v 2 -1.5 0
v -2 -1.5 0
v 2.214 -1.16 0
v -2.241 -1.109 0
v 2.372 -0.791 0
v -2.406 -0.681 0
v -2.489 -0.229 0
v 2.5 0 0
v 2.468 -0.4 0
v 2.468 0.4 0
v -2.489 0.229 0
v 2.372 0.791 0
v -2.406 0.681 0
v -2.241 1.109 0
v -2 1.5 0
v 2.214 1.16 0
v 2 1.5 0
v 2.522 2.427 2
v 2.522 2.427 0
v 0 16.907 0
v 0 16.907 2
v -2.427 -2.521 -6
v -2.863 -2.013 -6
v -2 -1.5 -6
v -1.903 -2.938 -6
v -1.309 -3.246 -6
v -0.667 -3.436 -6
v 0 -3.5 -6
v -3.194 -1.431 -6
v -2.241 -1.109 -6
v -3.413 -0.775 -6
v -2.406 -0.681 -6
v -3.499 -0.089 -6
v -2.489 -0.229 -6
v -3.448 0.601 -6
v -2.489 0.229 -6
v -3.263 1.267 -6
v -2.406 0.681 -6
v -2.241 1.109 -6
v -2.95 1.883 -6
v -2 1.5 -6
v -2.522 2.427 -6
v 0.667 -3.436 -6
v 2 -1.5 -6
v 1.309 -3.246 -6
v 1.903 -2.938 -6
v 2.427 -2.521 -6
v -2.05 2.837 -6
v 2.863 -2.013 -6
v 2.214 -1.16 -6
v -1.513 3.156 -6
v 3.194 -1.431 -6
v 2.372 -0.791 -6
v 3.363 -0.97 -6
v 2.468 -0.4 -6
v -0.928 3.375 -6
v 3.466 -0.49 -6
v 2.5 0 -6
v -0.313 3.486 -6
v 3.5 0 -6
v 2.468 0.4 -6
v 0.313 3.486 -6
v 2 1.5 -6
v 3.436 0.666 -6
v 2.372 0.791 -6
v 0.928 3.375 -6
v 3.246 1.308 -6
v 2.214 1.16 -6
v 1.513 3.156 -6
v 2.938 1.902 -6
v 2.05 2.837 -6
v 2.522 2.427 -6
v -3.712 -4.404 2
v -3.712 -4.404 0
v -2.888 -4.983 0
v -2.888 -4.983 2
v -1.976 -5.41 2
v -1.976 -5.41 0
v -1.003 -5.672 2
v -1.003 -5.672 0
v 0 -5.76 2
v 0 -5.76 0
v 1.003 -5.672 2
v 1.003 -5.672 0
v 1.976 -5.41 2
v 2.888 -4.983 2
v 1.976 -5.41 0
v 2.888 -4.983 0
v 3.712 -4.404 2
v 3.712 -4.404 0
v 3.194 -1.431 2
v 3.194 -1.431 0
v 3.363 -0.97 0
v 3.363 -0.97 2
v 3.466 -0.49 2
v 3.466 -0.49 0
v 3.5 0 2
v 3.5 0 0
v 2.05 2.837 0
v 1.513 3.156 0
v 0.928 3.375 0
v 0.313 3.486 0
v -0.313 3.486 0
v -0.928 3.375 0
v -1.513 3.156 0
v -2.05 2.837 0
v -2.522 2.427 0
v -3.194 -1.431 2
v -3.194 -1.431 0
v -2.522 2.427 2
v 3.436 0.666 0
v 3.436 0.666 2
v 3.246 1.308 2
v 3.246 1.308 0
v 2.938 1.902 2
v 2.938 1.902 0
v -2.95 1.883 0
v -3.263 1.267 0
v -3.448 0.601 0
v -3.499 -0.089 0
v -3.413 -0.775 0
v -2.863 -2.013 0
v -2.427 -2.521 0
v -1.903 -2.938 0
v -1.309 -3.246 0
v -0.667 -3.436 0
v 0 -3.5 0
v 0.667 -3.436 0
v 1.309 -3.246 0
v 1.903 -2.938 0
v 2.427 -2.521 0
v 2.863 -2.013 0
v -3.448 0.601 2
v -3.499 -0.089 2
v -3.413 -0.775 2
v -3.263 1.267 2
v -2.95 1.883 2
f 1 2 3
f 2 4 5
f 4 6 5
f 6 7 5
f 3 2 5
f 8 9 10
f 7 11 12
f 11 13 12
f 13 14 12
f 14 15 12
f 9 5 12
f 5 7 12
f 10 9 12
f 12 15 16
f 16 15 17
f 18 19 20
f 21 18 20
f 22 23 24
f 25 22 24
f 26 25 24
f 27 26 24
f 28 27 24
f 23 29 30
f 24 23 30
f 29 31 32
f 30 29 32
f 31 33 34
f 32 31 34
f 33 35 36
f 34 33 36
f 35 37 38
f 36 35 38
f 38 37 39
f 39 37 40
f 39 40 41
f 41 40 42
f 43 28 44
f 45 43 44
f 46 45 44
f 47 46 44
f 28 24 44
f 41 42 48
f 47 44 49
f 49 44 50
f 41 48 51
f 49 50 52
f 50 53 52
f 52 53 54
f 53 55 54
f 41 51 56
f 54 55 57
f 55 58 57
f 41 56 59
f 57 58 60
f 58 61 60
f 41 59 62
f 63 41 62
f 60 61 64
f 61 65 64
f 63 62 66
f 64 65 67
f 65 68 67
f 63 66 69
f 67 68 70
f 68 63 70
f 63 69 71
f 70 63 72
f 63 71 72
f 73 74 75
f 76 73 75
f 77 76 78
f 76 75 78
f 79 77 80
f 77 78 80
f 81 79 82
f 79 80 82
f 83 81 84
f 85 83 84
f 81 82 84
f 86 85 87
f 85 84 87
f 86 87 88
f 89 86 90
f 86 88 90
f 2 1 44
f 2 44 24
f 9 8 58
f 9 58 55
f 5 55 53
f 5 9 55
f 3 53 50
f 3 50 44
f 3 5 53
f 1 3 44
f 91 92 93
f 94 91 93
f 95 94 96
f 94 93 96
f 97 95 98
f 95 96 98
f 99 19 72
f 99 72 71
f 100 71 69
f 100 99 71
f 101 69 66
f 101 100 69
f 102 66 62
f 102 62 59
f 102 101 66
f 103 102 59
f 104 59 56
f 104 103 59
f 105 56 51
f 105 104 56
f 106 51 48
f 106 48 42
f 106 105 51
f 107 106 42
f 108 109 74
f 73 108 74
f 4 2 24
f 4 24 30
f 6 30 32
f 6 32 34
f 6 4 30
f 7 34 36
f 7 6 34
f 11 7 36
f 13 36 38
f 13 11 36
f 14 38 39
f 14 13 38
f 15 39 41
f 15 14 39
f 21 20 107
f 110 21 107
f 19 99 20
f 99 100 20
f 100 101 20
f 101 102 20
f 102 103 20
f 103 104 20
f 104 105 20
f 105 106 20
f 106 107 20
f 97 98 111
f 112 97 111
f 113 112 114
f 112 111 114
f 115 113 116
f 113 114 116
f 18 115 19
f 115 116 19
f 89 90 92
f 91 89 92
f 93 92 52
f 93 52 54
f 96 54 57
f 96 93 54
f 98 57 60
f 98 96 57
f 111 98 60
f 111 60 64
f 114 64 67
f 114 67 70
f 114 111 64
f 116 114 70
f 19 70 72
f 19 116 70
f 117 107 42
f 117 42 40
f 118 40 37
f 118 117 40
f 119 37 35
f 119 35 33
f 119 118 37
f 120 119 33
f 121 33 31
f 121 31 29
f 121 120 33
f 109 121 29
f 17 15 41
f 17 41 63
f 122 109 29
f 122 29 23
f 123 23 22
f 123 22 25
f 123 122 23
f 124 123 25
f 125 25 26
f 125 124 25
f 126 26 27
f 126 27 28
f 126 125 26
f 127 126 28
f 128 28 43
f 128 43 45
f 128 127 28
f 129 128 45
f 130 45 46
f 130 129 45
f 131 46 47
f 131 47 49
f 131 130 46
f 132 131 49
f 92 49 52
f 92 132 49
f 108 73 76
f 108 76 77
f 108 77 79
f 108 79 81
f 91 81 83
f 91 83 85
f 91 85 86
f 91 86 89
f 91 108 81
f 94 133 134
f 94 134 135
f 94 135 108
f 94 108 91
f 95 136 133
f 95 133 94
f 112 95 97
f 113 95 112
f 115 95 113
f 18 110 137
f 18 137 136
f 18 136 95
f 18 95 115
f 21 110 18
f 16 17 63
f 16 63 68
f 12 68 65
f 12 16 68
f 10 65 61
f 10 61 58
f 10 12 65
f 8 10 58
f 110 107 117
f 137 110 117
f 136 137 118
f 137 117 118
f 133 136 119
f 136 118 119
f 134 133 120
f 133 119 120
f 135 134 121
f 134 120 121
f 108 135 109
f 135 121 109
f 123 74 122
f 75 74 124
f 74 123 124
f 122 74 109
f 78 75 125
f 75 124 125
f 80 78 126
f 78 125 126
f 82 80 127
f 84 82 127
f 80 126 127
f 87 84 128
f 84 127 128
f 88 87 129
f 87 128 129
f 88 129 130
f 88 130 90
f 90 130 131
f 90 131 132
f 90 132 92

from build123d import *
from build123d import SkipClean  # not in build123d's __all__

# Parameters (mm, degrees)
F1_DEPTH = 2
F2_DEPTH = 6


with BuildPart() as f1:
    # F0 (on Top) → F1 (new body)
    with BuildSketch(Plane.XY):
        with BuildLine():
            Line((-2.522197513, 2.4266272284), (-3.1941037004, -1.430979228))
            ThreePointArc((-3.1941037004, -1.430979228), (0, -3.5), (3.1941037004, -1.430979228))
            Line((3.1941037004, -1.430979228), (2.522197513, 2.4266272284))
            ThreePointArc((2.522197513, 2.4266272284), (0, 3.5), (-2.522197513, 2.4266272284))
        make_face()
        with BuildLine():
            ThreePointArc((2, 1.5), (2.3717082451, 0.790569415), (2.5, 0))
            ThreePointArc((2.5, 0), (2.3717082451, -0.790569415), (2, -1.5))
            ThreePointArc((2, -1.5), (0, -2.5), (-2, -1.5))
            ThreePointArc((-2, -1.5), (-2.5, 0), (-2, 1.5))
            ThreePointArc((-2, 1.5), (0, 2.5), (2, 1.5))
        make_face(mode=Mode.SUBTRACT)
        with BuildLine():
            Line((0, 16.9072877616), (-2.522197513, 2.4266272284))
            ThreePointArc((-2.522197513, 2.4266272284), (0, 3.5), (2.522197513, 2.4266272284))
            Line((2.522197513, 2.4266272284), (0, 16.9072877616))
        make_face()
        with BuildLine():
            Line((-3.1941037004, -1.430979228), (-3.7119607441, -4.4041452929))
            ThreePointArc((-3.7119607441, -4.4041452929), (0, -5.7597871772), (3.7119607441, -4.4041452929))
            Line((3.7119607441, -4.4041452929), (3.1941037004, -1.430979228))
            ThreePointArc((3.1941037004, -1.430979228), (0, -3.5), (-3.1941037004, -1.430979228))
        make_face()
        with BuildLine():
            ThreePointArc((2, -1.5), (2.3717082451, -0.790569415), (2.5, 0))
            ThreePointArc((2.5, 0), (2.3717082451, 0.790569415), (2, 1.5))
            Line((2, 1.5), (-2, 1.5))
            ThreePointArc((-2, 1.5), (-2.5, 0), (-2, -1.5))
            Line((-2, -1.5), (2, -1.5))
        make_face()
        with BuildLine():
            Line((-2, 1.5), (2, 1.5))
            ThreePointArc((2, 1.5), (0, 2.5), (-2, 1.5))
        make_face()
        with BuildLine():
            ThreePointArc((-2, -1.5), (0, -2.5), (2, -1.5))
            Line((2, -1.5), (-2, -1.5))
        make_face()
        with BuildLine():
            Line((2.522197513, 2.4266272284), (3.1941037004, -1.430979228))
            ThreePointArc((3.1941037004, -1.430979228), (3.4226716868, -0.7316546482), (3.5, 0))
            ThreePointArc((3.5, 0), (3.2463588292, 1.3081109862), (2.522197513, 2.4266272284))
        make_face()
        with BuildLine():
            ThreePointArc((-2.522197513, 2.4266272284), (-3.4480874095, 0.6005774025), (-3.1941037004, -1.430979228))
            Line((-3.1941037004, -1.430979228), (-2.522197513, 2.4266272284))
        make_face()
    extrude(amount=F1_DEPTH)

    # F0 (on Top) → F2 (join)
    with BuildSketch(Plane.XY):
        with BuildLine():
            ThreePointArc((-2.522197513, 2.4266272284), (-3.4480874095, 0.6005774025), (-3.1941037004, -1.430979228))
            Line((-3.1941037004, -1.430979228), (-2.522197513, 2.4266272284))
        make_face()
        with BuildLine():
            Line((2.522197513, 2.4266272284), (3.1941037004, -1.430979228))
            ThreePointArc((3.1941037004, -1.430979228), (3.4226716868, -0.7316546482), (3.5, 0))
            ThreePointArc((3.5, 0), (3.2463588292, 1.3081109862), (2.522197513, 2.4266272284))
        make_face()
        with BuildLine():
            Line((-2.522197513, 2.4266272284), (-3.1941037004, -1.430979228))
            ThreePointArc((-3.1941037004, -1.430979228), (0, -3.5), (3.1941037004, -1.430979228))
            Line((3.1941037004, -1.430979228), (2.522197513, 2.4266272284))
            ThreePointArc((2.522197513, 2.4266272284), (0, 3.5), (-2.522197513, 2.4266272284))
        make_face()
        with BuildLine():
            ThreePointArc((2, 1.5), (2.3717082451, 0.790569415), (2.5, 0))
            ThreePointArc((2.5, 0), (2.3717082451, -0.790569415), (2, -1.5))
            ThreePointArc((2, -1.5), (0, -2.5), (-2, -1.5))
            ThreePointArc((-2, -1.5), (-2.5, 0), (-2, 1.5))
            ThreePointArc((-2, 1.5), (0, 2.5), (2, 1.5))
        make_face(mode=Mode.SUBTRACT)
        with BuildLine():
            Line((-2, 1.5), (2, 1.5))
            ThreePointArc((2, 1.5), (0, 2.5), (-2, 1.5))
        make_face()
        with BuildLine():
            ThreePointArc((-2, -1.5), (0, -2.5), (2, -1.5))
            Line((2, -1.5), (-2, -1.5))
        make_face()
    with SkipClean():  # cleaning this boolean's faces spoils the solid; the shape is the same uncleaned
        extrude(amount=-F2_DEPTH)


solid = f1.part
